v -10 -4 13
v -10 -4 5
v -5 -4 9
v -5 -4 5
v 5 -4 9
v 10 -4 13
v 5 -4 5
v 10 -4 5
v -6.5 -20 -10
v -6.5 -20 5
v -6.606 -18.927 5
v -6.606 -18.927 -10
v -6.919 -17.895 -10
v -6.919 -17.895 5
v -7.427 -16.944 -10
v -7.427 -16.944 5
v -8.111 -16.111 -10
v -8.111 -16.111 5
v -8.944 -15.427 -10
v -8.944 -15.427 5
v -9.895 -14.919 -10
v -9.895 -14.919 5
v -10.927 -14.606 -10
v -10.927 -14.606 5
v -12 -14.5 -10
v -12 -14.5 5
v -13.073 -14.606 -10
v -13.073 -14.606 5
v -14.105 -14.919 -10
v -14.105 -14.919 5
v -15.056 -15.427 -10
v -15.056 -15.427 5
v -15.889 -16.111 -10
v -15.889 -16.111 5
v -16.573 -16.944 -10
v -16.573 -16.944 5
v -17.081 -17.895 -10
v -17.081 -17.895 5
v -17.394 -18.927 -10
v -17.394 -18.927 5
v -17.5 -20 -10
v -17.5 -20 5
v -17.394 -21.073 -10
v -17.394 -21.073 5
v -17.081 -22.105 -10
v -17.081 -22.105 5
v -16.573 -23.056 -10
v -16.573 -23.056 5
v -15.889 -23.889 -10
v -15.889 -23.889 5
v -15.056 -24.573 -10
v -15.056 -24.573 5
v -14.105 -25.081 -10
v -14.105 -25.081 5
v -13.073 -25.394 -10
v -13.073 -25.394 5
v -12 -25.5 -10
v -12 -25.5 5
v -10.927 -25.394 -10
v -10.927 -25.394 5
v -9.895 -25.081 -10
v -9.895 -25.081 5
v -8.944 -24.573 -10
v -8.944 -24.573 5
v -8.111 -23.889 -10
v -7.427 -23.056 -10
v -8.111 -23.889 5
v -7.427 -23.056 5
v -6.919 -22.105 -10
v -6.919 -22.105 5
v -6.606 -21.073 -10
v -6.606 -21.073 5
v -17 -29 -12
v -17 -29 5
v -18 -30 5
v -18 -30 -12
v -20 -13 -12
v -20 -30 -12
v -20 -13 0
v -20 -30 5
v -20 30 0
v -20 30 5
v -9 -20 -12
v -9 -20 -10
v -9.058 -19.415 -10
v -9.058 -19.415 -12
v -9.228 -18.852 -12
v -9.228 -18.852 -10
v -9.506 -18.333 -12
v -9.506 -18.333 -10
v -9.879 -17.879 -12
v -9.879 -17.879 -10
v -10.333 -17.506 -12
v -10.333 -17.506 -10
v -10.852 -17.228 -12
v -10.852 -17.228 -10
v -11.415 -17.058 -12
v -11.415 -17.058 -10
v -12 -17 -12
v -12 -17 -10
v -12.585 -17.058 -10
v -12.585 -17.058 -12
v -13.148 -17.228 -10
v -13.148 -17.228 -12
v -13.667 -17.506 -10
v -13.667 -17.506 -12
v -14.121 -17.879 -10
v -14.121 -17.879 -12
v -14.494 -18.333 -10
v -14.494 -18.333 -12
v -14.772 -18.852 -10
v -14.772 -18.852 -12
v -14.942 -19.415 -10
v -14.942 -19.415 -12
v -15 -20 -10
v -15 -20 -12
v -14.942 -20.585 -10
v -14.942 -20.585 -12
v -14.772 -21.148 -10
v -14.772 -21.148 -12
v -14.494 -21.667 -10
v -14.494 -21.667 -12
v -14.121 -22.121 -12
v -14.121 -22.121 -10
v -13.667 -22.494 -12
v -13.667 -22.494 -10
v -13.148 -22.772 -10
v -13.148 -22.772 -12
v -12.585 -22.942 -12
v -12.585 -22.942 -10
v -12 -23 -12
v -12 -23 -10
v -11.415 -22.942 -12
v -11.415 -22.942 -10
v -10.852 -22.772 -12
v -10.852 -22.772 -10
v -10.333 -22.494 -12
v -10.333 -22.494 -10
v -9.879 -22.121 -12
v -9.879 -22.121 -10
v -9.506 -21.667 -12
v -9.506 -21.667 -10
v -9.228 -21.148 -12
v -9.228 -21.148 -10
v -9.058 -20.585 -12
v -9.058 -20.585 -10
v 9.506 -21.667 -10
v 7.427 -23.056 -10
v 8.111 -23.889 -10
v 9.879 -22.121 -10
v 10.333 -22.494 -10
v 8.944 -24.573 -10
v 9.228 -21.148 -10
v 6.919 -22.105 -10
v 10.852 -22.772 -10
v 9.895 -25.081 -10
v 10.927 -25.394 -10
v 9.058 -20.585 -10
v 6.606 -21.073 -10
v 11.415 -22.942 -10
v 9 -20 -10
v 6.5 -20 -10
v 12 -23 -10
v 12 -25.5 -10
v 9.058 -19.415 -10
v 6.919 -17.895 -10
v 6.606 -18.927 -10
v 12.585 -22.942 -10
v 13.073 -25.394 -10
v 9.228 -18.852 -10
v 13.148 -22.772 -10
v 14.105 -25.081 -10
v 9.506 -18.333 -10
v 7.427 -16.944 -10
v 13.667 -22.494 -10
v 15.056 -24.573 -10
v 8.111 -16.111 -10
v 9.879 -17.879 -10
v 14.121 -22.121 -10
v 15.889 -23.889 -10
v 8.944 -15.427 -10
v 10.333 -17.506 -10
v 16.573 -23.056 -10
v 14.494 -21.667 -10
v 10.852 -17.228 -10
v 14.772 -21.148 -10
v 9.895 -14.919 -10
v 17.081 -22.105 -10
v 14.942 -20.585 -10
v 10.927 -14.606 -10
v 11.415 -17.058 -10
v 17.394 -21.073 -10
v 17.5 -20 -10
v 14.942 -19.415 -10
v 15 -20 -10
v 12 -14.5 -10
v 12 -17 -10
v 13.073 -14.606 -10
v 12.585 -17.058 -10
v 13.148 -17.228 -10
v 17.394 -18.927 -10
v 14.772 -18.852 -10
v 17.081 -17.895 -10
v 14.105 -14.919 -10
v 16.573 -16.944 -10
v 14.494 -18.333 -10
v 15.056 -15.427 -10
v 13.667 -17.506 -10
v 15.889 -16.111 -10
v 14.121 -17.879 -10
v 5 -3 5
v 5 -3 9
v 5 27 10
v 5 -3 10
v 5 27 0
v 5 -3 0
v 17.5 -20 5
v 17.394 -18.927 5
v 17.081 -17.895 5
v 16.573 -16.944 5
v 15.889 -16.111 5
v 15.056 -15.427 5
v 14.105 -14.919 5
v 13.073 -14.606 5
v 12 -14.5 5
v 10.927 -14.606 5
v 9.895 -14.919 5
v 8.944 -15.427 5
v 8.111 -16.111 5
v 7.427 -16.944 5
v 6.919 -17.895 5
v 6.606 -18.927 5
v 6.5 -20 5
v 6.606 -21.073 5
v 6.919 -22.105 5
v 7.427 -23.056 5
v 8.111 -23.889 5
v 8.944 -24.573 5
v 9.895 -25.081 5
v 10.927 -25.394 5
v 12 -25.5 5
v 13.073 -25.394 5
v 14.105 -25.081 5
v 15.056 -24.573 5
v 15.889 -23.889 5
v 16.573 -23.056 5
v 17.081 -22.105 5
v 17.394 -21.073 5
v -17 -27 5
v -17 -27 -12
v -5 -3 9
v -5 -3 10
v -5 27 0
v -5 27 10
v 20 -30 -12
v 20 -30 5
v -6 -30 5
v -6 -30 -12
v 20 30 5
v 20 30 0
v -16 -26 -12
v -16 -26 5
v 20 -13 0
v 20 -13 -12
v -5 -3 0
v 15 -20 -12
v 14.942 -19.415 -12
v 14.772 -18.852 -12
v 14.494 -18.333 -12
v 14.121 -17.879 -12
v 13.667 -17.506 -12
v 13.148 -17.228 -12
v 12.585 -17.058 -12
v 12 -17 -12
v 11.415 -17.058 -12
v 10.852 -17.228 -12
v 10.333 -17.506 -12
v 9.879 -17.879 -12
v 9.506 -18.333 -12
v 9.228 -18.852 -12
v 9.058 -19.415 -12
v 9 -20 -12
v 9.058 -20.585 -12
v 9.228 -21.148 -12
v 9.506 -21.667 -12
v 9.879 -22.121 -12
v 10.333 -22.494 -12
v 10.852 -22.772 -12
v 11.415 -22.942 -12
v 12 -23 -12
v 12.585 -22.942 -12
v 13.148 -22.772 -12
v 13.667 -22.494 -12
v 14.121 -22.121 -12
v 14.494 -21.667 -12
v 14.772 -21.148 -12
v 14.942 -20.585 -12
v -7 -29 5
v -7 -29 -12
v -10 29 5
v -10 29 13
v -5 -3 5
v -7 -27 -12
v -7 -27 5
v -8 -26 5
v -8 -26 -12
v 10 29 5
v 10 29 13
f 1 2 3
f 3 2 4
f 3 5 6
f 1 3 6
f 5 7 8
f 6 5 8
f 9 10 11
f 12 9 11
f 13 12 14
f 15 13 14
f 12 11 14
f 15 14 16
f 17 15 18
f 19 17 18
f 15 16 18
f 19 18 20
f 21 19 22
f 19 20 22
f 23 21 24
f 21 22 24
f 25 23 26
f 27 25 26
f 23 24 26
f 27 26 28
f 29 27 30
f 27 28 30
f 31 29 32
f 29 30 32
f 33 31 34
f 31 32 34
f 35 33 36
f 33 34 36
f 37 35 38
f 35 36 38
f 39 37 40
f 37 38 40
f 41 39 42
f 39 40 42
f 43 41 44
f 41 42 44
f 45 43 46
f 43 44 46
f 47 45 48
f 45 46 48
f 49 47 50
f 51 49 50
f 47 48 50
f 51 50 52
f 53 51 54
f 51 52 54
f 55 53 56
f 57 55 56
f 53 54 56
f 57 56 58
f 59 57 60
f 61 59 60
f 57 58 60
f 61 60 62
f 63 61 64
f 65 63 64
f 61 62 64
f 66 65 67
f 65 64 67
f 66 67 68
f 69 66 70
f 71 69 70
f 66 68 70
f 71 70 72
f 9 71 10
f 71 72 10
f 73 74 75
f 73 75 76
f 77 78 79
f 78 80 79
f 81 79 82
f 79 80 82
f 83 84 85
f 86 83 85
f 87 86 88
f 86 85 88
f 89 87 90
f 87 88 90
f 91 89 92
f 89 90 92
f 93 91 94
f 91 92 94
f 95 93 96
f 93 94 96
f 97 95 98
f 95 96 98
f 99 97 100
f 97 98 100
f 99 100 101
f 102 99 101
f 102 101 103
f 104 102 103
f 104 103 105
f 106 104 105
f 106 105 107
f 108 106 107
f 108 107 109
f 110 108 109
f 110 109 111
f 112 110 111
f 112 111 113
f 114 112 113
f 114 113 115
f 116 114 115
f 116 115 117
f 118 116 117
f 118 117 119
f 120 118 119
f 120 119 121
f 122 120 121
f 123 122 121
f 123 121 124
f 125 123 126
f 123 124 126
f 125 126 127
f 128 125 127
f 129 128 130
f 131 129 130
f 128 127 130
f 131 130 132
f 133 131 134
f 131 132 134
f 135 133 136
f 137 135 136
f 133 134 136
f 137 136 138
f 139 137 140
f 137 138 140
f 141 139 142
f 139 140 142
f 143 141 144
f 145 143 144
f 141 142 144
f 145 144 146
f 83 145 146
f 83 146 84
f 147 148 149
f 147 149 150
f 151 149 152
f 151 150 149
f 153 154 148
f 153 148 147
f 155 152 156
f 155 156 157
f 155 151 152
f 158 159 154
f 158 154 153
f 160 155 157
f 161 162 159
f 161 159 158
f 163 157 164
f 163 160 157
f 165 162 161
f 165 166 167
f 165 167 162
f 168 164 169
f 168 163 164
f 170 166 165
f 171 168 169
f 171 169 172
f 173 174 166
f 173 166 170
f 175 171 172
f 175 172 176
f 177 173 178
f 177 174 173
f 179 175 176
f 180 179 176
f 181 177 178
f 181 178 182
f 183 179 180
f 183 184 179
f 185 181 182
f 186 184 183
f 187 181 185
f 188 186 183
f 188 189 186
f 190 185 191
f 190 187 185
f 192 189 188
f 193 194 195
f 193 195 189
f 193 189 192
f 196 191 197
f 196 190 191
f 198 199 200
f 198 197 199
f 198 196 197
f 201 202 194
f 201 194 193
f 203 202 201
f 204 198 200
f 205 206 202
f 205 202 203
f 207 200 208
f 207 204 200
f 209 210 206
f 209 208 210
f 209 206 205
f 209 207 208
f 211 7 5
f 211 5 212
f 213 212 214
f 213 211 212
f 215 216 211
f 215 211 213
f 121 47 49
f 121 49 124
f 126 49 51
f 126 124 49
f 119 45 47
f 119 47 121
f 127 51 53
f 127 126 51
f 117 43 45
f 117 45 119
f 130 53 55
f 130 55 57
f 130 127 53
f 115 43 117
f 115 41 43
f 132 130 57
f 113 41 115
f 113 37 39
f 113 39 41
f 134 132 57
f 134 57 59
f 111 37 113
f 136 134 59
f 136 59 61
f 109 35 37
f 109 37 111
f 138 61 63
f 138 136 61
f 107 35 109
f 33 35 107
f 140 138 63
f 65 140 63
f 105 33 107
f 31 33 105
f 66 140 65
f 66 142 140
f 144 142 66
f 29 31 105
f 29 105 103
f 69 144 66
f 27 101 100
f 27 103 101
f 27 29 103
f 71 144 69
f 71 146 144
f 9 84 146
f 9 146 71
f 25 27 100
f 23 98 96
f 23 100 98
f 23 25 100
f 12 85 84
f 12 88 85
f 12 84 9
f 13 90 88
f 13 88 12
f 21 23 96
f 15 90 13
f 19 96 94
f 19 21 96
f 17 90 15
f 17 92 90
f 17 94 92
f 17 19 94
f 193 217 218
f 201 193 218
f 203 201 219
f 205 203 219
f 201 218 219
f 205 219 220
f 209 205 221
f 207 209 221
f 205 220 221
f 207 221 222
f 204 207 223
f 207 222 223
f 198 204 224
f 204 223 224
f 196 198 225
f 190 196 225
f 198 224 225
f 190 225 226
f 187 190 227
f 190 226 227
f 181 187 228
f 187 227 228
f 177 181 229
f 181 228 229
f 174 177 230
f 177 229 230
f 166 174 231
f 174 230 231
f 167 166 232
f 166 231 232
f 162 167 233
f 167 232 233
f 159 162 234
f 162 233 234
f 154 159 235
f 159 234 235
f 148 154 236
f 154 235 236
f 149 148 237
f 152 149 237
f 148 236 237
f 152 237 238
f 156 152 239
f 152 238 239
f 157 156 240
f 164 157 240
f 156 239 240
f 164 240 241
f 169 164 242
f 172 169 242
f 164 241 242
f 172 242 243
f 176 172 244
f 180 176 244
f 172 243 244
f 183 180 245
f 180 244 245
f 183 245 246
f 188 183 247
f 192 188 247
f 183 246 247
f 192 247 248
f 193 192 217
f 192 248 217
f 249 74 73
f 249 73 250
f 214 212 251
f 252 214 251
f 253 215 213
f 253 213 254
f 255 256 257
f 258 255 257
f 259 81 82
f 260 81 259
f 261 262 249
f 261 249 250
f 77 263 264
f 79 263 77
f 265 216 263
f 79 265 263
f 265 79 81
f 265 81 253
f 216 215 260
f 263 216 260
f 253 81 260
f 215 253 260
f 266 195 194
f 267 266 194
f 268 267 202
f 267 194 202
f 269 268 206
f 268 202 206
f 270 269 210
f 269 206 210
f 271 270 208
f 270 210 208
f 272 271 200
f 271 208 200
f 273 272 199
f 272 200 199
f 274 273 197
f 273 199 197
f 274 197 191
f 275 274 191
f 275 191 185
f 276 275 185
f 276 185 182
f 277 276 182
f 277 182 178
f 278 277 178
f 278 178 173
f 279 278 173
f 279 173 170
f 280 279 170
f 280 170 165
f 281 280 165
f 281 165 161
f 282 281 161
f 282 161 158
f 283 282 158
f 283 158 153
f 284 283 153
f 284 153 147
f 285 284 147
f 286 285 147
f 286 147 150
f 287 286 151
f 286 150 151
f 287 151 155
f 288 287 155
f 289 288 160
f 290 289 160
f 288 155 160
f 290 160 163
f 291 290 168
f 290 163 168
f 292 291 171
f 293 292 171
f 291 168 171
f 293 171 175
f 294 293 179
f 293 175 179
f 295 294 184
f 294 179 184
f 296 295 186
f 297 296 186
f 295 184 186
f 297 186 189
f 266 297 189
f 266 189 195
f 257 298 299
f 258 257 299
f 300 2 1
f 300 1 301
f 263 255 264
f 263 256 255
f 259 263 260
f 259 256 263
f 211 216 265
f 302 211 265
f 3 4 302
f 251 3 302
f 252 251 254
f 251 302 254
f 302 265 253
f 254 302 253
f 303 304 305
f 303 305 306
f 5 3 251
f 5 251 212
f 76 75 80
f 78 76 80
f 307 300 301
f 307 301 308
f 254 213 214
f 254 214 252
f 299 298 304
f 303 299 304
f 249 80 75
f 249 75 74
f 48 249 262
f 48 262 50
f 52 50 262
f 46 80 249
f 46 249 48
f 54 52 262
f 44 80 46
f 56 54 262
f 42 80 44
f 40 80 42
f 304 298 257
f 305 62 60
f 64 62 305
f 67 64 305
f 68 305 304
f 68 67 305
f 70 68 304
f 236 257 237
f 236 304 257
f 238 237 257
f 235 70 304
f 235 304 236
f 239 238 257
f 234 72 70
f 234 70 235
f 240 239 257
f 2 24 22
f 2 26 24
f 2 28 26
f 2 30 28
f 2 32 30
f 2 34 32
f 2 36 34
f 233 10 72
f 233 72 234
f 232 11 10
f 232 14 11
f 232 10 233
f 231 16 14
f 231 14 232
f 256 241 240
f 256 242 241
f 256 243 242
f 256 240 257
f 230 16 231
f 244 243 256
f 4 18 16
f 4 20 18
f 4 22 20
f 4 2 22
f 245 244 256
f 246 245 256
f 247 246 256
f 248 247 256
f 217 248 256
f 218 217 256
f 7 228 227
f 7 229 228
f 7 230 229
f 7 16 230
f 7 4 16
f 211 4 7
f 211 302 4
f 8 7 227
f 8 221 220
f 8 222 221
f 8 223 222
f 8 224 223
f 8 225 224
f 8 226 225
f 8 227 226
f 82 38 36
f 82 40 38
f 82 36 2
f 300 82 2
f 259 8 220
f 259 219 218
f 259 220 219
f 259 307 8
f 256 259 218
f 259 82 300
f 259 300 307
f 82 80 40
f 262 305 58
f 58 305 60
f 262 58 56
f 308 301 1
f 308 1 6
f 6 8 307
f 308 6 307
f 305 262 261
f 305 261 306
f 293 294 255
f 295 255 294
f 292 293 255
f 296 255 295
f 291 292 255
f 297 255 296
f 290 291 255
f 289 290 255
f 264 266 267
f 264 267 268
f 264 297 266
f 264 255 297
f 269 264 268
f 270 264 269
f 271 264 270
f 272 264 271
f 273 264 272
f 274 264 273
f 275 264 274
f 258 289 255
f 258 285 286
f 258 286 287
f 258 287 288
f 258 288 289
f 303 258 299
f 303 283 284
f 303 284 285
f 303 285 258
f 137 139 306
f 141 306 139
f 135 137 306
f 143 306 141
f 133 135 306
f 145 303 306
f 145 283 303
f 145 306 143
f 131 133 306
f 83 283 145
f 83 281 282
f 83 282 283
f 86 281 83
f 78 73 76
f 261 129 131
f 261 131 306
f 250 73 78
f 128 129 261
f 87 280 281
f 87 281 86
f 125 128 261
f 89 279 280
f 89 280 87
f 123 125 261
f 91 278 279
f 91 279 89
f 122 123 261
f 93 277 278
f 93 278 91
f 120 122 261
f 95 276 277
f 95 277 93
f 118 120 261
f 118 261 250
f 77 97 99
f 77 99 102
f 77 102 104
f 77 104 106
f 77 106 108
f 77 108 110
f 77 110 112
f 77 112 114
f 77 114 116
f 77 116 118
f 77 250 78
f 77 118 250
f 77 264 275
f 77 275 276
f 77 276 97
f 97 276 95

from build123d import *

# Parameters (mm, degrees)
SKETCH_1_W          = 40
SKETCH_1_H          = 60
EXTRUDE_1_DEPTH     = 5
SKETCH_2_W          = 40
SKETCH_2_H          = 17
EXTRUDE_2_DEPTH     = 12
SKETCH_3_R          = 5.5
CUT_EXTRUDE_1_DEPTH = 15
SKETCH_4_R          = 3
CUT_EXTRUDE_2_DEPTH = 10
SKETCH_7_W          = 20
SKETCH_7_H          = 33
EXTRUDE_4_DEPTH     = 8
SKETCH_8_W          = 10
SKETCH_8_H          = 30
CUT_EXTRUDE_3_DEPTH = 10
SKETCH_9_W          = 10
SKETCH_9_H          = 4
CUT_EXTRUDE_4_DEPTH = 10
SKETCH_10_W         = 10
SKETCH_10_H         = 4
CUT_EXTRUDE_5_DEPTH = 25
CHAMFER_1_SIZE      = 1


with BuildPart() as part:
    # 草图1 → 凸台-拉伸1 (new body)
    with BuildSketch(Plane.XY):
        Rectangle(SKETCH_1_W, SKETCH_1_H)
    extrude(amount=EXTRUDE_1_DEPTH)

    # 草图2 → 凸台-拉伸2 (add)
    with BuildSketch(Plane(origin=(0, 0, 0), x_dir=(-1, 0, 0), z_dir=(0, 0, -1))):
        with Locations((0, -21.5)):
            Rectangle(SKETCH_2_W, SKETCH_2_H)
    extrude(amount=EXTRUDE_2_DEPTH)

    # 草图3 → 切除-拉伸1 (cut)
    with BuildSketch(Plane.XY.offset(5)):
        with Locations((-12, -20)):
            Circle(SKETCH_3_R)
        with Locations((12, -20)):
            Circle(SKETCH_3_R)
    extrude(amount=-CUT_EXTRUDE_1_DEPTH, mode=Mode.SUBTRACT)

    # 草图4 → 切除-拉伸2 (cut)
    with BuildSketch(Plane.XY.offset(-10)):
        with Locations((-12, -20)):
            Circle(SKETCH_4_R)
        with Locations((12, -20)):
            Circle(SKETCH_4_R)
    extrude(amount=-CUT_EXTRUDE_2_DEPTH, mode=Mode.SUBTRACT)

    # 草图7 → 凸台-拉伸4 (add)
    with BuildSketch(Plane.XY.offset(5)):
        with Locations((0, 12.5)):
            Rectangle(SKETCH_7_W, SKETCH_7_H)
    extrude(amount=EXTRUDE_4_DEPTH)

    # 草图8 → 切除-拉伸3 (cut)
    with BuildSketch(Plane(origin=(0, 0, 0), x_dir=(-1, 0, 0), z_dir=(0, 0, -1))):
        with Locations((0, 12)):
            Rectangle(SKETCH_8_W, SKETCH_8_H)
    extrude(amount=-CUT_EXTRUDE_3_DEPTH, mode=Mode.SUBTRACT)

    # 草图9 → 切除-拉伸4 (cut)
    with BuildSketch(Plane.XZ.offset(4)):
        with Locations((0, 7)):
            Rectangle(SKETCH_9_W, SKETCH_9_H)
    extrude(amount=-CUT_EXTRUDE_4_DEPTH, mode=Mode.SUBTRACT)

    # 草图10 → 切除-拉伸5 (cut)
    with BuildSketch(Plane.XY.offset(5)):
        with Locations((-12, -28)):
            Rectangle(SKETCH_10_W, SKETCH_10_H)
    extrude(amount=-CUT_EXTRUDE_5_DEPTH, mode=Mode.SUBTRACT)

    # 倒角1
    chamfer_1_edges = [part.edges().sort_by_distance(p)[0] for p in [
        (-17, -30, -3.5),
        (-17, -26, -3.5),
        (-7, -26, -3.5),
        (-7, -30, -3.5),
    ]]
    chamfer(chamfer_1_edges, length=CHAMFER_1_SIZE)


solid = part.part
